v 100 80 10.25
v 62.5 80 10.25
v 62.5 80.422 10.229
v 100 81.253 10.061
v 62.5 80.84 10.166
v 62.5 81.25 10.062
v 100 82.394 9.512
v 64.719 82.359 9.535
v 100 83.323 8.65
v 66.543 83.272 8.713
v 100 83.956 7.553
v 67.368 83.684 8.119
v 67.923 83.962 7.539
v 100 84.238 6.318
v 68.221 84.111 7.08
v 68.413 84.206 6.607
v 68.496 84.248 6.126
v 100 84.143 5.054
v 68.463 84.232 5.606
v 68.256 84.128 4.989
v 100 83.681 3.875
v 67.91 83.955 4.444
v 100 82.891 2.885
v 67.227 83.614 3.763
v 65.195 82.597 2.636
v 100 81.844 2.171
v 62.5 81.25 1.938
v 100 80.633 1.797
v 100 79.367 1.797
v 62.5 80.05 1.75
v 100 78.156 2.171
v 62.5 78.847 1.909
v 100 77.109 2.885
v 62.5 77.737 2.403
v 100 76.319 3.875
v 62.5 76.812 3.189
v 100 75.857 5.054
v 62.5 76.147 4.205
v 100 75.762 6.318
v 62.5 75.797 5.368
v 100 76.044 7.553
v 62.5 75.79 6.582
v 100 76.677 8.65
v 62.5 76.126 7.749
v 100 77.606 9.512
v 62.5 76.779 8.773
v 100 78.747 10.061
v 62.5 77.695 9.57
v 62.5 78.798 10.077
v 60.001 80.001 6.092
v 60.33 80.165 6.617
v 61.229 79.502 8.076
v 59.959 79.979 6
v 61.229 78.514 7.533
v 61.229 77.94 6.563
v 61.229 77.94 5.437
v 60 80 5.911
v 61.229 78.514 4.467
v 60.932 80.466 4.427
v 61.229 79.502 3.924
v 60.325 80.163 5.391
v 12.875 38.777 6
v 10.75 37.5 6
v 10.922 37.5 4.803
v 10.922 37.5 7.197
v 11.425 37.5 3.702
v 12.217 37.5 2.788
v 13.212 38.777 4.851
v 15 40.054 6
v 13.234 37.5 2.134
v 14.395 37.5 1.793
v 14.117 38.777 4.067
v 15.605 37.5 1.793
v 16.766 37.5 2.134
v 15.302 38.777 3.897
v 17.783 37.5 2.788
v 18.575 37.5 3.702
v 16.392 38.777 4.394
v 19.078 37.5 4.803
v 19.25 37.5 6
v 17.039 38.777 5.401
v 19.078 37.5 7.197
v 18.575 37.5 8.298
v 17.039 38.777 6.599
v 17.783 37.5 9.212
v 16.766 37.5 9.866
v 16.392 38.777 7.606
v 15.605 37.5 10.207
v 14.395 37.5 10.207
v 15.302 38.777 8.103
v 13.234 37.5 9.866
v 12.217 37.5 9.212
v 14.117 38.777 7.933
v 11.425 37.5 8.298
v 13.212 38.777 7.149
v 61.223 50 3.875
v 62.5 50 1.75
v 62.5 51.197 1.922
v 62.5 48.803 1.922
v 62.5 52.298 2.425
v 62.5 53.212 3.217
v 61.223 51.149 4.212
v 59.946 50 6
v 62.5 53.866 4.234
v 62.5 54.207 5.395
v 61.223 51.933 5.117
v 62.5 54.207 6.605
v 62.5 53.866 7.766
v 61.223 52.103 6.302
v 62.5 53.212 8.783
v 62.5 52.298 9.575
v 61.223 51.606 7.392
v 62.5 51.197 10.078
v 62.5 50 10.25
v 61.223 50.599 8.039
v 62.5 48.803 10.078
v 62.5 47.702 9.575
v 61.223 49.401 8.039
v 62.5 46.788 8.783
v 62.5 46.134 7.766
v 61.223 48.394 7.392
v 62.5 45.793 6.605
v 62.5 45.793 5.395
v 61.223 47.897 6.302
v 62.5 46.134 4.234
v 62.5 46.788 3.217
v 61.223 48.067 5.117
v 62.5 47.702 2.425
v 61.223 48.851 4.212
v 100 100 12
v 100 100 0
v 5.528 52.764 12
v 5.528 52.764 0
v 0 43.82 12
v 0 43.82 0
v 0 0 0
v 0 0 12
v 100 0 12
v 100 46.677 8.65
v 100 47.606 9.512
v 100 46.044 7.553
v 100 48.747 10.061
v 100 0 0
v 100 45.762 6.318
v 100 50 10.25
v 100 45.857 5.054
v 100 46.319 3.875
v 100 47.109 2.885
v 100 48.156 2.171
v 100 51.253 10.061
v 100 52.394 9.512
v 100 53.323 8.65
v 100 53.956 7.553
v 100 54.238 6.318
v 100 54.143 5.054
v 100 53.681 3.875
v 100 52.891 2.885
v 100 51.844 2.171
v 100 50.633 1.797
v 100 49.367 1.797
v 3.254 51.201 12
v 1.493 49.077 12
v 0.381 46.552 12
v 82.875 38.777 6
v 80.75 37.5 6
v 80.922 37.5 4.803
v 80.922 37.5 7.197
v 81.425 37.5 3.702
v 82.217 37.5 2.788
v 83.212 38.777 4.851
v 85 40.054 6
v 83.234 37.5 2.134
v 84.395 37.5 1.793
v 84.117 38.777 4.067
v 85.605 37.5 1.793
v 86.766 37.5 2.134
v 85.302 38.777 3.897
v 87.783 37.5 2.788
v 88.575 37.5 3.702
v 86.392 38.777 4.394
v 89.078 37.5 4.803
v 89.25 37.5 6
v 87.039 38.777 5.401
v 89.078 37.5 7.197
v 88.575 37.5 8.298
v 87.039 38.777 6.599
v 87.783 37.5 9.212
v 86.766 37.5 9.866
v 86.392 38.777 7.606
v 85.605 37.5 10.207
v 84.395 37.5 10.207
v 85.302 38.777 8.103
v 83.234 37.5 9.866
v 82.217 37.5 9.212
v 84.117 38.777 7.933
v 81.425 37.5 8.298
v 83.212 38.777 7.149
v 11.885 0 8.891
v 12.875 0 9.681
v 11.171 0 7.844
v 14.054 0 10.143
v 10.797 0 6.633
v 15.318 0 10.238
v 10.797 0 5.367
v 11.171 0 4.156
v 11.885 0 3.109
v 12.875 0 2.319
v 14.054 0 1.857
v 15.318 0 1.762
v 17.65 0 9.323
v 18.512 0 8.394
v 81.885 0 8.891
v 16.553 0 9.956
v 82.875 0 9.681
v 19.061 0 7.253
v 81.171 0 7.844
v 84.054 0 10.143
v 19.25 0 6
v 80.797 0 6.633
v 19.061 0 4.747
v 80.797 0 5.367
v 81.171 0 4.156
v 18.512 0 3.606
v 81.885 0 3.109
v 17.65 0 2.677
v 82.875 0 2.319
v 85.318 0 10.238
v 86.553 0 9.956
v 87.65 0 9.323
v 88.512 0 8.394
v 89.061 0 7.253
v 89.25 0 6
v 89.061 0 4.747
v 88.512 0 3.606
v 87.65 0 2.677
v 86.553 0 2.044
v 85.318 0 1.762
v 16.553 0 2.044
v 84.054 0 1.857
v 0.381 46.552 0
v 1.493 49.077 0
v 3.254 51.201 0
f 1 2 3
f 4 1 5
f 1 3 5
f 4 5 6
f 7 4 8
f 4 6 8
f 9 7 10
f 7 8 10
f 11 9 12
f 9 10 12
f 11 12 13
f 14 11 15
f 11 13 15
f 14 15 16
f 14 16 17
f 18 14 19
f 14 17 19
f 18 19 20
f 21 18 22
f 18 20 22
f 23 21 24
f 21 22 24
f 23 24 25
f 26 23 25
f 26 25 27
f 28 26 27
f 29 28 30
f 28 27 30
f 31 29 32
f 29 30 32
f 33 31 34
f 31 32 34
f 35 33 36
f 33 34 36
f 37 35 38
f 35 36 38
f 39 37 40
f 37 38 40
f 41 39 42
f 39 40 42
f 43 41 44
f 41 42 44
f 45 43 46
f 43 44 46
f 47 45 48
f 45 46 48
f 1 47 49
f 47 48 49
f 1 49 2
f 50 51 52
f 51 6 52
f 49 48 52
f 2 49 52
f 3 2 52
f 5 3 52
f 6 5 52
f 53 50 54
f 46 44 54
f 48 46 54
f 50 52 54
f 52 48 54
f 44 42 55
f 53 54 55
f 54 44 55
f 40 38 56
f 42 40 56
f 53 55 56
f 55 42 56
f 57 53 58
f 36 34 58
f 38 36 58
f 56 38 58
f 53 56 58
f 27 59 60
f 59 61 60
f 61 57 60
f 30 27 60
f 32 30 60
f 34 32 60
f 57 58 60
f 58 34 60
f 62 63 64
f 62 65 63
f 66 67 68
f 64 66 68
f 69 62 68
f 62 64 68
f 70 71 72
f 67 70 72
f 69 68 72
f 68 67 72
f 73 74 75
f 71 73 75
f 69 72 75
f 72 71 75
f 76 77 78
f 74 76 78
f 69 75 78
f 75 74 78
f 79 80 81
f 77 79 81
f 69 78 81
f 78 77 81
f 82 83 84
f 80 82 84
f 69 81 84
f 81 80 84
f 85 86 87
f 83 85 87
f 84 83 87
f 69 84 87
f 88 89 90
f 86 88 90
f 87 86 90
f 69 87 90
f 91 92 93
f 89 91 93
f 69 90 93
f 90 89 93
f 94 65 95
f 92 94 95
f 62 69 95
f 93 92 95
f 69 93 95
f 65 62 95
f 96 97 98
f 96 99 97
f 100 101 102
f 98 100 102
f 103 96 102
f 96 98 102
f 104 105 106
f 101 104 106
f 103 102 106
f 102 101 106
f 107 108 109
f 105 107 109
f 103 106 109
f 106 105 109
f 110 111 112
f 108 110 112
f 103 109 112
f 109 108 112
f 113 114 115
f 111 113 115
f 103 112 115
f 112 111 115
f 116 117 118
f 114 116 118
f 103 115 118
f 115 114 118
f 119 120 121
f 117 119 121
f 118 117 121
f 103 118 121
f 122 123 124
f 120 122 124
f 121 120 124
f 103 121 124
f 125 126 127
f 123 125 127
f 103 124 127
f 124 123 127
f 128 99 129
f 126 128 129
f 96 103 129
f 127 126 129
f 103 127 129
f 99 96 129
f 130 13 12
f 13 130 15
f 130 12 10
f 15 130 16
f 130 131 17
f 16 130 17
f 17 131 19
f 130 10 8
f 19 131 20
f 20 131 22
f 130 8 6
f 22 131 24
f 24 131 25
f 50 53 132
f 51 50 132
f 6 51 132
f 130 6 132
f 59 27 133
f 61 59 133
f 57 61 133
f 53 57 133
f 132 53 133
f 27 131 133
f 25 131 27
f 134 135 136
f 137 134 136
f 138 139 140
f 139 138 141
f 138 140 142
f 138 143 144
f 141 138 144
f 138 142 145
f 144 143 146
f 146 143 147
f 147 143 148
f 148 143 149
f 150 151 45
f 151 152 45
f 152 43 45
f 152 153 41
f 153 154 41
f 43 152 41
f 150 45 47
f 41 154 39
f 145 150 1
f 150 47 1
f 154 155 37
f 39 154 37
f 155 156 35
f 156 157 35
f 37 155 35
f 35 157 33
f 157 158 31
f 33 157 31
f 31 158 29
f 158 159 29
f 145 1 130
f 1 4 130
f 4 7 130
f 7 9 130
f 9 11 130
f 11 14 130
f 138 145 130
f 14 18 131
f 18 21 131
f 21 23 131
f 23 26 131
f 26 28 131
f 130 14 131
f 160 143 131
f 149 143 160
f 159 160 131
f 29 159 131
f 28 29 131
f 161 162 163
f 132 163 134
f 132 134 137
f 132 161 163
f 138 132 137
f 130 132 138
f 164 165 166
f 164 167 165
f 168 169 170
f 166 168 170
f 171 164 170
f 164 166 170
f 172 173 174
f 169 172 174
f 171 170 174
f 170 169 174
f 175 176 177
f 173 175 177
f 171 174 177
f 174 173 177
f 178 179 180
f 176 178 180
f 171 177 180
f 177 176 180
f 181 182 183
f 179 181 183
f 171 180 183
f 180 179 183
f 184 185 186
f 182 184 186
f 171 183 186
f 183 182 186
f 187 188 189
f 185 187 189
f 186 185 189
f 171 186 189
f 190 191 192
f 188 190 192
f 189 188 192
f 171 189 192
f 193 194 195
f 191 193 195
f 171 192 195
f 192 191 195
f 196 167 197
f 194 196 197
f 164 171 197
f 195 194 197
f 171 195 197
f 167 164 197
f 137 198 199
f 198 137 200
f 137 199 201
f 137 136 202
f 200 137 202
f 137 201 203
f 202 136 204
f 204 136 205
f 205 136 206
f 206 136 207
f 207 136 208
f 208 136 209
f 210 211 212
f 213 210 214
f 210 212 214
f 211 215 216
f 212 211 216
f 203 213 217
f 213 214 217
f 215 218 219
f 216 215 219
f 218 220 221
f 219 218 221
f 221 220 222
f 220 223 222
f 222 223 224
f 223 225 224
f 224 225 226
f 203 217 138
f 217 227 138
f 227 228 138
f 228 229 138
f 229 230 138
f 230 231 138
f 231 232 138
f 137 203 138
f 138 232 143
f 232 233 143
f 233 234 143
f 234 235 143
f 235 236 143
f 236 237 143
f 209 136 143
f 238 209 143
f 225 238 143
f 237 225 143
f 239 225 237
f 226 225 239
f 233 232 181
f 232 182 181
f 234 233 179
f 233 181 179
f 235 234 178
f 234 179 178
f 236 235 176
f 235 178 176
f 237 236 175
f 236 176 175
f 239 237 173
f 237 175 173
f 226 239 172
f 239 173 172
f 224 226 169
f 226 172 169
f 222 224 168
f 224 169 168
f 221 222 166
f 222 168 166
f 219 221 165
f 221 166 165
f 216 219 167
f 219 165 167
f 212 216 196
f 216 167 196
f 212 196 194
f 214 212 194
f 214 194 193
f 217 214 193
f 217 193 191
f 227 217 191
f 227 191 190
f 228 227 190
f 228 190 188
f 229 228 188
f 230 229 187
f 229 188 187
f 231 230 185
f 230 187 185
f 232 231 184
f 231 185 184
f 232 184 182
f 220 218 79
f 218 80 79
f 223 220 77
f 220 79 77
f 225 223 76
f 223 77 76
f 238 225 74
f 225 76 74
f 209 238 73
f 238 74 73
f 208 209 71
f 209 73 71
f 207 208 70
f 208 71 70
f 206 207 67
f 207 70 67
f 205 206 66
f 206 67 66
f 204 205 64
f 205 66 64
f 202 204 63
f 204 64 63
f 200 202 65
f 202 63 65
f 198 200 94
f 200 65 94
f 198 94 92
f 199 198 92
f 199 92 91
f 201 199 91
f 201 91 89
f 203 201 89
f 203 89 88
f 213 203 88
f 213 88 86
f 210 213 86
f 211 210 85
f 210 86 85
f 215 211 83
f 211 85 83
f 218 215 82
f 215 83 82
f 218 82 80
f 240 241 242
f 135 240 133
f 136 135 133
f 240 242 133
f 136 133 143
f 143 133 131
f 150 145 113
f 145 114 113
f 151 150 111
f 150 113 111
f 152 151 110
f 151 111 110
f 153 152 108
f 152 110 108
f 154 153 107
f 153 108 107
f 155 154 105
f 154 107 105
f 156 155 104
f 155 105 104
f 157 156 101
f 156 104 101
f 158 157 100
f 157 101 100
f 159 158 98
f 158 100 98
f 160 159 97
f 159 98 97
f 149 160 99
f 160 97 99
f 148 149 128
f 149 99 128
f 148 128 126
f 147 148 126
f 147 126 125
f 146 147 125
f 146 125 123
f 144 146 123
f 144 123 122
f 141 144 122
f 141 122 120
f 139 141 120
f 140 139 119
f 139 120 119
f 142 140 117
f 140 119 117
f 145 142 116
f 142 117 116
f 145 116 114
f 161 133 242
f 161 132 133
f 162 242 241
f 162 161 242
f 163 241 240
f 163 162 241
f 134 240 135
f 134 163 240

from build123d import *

# Parameters (mm, degrees)
AUFSATZ_LINEAR_AUSTRAGEN1_DEPTH = 12
M10_GEWINDEBOHRUNG1_D           = 8.5
M10_GEWINDEBOHRUNG1_DEPTH       = 37.5
M10_GEWINDEBOHRUNG1_TIP         = 2.553657631
M10_GEWINDEBOHRUNG2_D           = 8.5
M10_GEWINDEBOHRUNG2_DEPTH       = 37.5
M10_GEWINDEBOHRUNG2_TIP         = 2.553657631
VERRUNDUNG1_R                   = 10


with BuildPart() as part:
    # Skizze1 → Aufsatz-Linear austragen1 (new body)
    with BuildSketch(Plane.XY):
        Polygon((100, 0), (100, 100), (0, 50), (0, 0), align=None)
    extrude(amount=AUFSATZ_LINEAR_AUSTRAGEN1_DEPTH)

    # M10 Gewindebohrung1
    with Locations(Plane(origin=(0, 0, 0), x_dir=(-1, 0, 0), z_dir=(0, -1, 0))):
        with Locations((-15, -6), (-85, -6)):
            Hole(M10_GEWINDEBOHRUNG1_D / 2, depth=M10_GEWINDEBOHRUNG1_DEPTH)
            with Locations((0, 0, -(M10_GEWINDEBOHRUNG1_DEPTH + M10_GEWINDEBOHRUNG1_TIP / 2))):  # 118° drill point
                Cone(0, M10_GEWINDEBOHRUNG1_D / 2, M10_GEWINDEBOHRUNG1_TIP, mode=Mode.SUBTRACT)

    # M10 Gewindebohrung2
    with Locations(Plane(origin=(100, 0, 0), x_dir=(0, 0, -1), z_dir=(1, 0, 0))):
        with Locations((-6, 50), (-6, 80)):
            Hole(M10_GEWINDEBOHRUNG2_D / 2, depth=M10_GEWINDEBOHRUNG2_DEPTH)
            with Locations((0, 0, -(M10_GEWINDEBOHRUNG2_DEPTH + M10_GEWINDEBOHRUNG2_TIP / 2))):  # 118° drill point
                Cone(0, M10_GEWINDEBOHRUNG2_D / 2, M10_GEWINDEBOHRUNG2_TIP, mode=Mode.SUBTRACT)

    # Verrundung1
    verrundung1_edges = [part.edges().sort_by_distance(p)[0] for p in [
        (0, 50, 6),
    ]]
    fillet(verrundung1_edges, radius=VERRUNDUNG1_R)


solid = part.part
